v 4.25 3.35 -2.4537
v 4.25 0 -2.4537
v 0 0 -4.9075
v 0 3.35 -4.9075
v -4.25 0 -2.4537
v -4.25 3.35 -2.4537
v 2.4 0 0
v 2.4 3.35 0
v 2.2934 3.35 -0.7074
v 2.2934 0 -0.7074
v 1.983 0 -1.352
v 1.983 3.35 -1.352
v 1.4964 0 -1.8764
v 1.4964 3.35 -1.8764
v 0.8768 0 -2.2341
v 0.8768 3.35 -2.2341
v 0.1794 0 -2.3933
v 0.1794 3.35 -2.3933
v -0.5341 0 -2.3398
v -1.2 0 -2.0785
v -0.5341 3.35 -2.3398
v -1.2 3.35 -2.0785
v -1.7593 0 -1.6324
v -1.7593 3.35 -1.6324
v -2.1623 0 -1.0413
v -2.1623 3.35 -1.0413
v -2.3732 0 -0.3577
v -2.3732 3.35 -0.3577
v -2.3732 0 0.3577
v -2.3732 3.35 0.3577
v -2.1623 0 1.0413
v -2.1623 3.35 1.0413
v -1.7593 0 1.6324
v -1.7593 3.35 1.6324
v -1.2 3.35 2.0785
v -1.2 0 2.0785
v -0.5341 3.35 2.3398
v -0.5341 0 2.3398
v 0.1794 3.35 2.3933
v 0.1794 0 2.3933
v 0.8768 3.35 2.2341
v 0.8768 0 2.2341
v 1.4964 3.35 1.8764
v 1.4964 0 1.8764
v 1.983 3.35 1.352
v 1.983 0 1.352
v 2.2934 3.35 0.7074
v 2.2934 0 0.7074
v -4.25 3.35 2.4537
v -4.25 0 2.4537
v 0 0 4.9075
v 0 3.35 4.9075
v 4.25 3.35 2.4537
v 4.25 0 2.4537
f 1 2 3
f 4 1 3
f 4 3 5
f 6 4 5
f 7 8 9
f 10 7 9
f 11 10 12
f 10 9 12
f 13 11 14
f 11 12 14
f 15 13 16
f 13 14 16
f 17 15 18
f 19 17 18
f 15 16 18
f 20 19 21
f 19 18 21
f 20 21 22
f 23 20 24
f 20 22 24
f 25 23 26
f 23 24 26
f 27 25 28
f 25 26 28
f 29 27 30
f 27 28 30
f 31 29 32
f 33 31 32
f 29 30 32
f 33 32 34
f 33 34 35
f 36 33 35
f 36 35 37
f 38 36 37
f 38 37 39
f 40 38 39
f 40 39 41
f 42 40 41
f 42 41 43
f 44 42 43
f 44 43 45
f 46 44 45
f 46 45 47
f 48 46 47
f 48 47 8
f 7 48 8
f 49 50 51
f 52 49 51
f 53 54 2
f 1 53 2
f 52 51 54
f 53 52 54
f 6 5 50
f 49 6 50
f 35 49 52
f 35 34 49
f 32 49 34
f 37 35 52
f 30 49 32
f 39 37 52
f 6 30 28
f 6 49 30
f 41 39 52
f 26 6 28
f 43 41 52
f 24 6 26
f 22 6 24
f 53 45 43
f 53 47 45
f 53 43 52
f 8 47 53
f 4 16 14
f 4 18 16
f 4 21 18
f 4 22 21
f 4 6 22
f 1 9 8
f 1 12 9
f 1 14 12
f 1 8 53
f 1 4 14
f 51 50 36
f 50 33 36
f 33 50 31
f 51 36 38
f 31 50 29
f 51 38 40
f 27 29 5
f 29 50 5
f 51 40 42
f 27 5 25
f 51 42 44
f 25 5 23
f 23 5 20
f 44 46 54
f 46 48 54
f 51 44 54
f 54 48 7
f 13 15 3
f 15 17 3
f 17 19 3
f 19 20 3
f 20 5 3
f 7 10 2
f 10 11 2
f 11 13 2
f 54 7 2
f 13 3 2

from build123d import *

# Parameters (mm, degrees)
BOSS_EXTRUDE1_DEPTH = 3.35
CUT_EXTRUDE1_REACH  = 5.35
SKETCH2_R           = 2.4


with BuildPart() as part:
    # Sketch1 → Boss-Extrude1 (new body)
    with BuildSketch(Plane(origin=(0, 0, 0), x_dir=(1, 0, 0), z_dir=(0, 1, 0))):
        Polygon((0, 4.907477288), (-4.25, 2.453738644), (-4.25, -2.453738644), (0, -4.907477288), (4.25, -2.453738644), (4.25, 2.453738644), align=None)
    extrude(amount=BOSS_EXTRUDE1_DEPTH)

    # Sketch2 → Cut-Extrude1 (cut, up to next)
    with BuildSketch(Plane(origin=(0, 3.35, 0), x_dir=(1, 0, 0), z_dir=(0, 1, 0)), mode=Mode.PRIVATE) as cut_extrude1_sk1:
        Circle(SKETCH2_R)
    cut_extrude1_tool1 = extrude(cut_extrude1_sk1.sketch, amount=-CUT_EXTRUDE1_REACH, mode=Mode.PRIVATE) & part.part
    add(cut_extrude1_tool1.solids().sort_by_distance((0, 3.35, 0))[0], mode=Mode.SUBTRACT)


solid = part.part
